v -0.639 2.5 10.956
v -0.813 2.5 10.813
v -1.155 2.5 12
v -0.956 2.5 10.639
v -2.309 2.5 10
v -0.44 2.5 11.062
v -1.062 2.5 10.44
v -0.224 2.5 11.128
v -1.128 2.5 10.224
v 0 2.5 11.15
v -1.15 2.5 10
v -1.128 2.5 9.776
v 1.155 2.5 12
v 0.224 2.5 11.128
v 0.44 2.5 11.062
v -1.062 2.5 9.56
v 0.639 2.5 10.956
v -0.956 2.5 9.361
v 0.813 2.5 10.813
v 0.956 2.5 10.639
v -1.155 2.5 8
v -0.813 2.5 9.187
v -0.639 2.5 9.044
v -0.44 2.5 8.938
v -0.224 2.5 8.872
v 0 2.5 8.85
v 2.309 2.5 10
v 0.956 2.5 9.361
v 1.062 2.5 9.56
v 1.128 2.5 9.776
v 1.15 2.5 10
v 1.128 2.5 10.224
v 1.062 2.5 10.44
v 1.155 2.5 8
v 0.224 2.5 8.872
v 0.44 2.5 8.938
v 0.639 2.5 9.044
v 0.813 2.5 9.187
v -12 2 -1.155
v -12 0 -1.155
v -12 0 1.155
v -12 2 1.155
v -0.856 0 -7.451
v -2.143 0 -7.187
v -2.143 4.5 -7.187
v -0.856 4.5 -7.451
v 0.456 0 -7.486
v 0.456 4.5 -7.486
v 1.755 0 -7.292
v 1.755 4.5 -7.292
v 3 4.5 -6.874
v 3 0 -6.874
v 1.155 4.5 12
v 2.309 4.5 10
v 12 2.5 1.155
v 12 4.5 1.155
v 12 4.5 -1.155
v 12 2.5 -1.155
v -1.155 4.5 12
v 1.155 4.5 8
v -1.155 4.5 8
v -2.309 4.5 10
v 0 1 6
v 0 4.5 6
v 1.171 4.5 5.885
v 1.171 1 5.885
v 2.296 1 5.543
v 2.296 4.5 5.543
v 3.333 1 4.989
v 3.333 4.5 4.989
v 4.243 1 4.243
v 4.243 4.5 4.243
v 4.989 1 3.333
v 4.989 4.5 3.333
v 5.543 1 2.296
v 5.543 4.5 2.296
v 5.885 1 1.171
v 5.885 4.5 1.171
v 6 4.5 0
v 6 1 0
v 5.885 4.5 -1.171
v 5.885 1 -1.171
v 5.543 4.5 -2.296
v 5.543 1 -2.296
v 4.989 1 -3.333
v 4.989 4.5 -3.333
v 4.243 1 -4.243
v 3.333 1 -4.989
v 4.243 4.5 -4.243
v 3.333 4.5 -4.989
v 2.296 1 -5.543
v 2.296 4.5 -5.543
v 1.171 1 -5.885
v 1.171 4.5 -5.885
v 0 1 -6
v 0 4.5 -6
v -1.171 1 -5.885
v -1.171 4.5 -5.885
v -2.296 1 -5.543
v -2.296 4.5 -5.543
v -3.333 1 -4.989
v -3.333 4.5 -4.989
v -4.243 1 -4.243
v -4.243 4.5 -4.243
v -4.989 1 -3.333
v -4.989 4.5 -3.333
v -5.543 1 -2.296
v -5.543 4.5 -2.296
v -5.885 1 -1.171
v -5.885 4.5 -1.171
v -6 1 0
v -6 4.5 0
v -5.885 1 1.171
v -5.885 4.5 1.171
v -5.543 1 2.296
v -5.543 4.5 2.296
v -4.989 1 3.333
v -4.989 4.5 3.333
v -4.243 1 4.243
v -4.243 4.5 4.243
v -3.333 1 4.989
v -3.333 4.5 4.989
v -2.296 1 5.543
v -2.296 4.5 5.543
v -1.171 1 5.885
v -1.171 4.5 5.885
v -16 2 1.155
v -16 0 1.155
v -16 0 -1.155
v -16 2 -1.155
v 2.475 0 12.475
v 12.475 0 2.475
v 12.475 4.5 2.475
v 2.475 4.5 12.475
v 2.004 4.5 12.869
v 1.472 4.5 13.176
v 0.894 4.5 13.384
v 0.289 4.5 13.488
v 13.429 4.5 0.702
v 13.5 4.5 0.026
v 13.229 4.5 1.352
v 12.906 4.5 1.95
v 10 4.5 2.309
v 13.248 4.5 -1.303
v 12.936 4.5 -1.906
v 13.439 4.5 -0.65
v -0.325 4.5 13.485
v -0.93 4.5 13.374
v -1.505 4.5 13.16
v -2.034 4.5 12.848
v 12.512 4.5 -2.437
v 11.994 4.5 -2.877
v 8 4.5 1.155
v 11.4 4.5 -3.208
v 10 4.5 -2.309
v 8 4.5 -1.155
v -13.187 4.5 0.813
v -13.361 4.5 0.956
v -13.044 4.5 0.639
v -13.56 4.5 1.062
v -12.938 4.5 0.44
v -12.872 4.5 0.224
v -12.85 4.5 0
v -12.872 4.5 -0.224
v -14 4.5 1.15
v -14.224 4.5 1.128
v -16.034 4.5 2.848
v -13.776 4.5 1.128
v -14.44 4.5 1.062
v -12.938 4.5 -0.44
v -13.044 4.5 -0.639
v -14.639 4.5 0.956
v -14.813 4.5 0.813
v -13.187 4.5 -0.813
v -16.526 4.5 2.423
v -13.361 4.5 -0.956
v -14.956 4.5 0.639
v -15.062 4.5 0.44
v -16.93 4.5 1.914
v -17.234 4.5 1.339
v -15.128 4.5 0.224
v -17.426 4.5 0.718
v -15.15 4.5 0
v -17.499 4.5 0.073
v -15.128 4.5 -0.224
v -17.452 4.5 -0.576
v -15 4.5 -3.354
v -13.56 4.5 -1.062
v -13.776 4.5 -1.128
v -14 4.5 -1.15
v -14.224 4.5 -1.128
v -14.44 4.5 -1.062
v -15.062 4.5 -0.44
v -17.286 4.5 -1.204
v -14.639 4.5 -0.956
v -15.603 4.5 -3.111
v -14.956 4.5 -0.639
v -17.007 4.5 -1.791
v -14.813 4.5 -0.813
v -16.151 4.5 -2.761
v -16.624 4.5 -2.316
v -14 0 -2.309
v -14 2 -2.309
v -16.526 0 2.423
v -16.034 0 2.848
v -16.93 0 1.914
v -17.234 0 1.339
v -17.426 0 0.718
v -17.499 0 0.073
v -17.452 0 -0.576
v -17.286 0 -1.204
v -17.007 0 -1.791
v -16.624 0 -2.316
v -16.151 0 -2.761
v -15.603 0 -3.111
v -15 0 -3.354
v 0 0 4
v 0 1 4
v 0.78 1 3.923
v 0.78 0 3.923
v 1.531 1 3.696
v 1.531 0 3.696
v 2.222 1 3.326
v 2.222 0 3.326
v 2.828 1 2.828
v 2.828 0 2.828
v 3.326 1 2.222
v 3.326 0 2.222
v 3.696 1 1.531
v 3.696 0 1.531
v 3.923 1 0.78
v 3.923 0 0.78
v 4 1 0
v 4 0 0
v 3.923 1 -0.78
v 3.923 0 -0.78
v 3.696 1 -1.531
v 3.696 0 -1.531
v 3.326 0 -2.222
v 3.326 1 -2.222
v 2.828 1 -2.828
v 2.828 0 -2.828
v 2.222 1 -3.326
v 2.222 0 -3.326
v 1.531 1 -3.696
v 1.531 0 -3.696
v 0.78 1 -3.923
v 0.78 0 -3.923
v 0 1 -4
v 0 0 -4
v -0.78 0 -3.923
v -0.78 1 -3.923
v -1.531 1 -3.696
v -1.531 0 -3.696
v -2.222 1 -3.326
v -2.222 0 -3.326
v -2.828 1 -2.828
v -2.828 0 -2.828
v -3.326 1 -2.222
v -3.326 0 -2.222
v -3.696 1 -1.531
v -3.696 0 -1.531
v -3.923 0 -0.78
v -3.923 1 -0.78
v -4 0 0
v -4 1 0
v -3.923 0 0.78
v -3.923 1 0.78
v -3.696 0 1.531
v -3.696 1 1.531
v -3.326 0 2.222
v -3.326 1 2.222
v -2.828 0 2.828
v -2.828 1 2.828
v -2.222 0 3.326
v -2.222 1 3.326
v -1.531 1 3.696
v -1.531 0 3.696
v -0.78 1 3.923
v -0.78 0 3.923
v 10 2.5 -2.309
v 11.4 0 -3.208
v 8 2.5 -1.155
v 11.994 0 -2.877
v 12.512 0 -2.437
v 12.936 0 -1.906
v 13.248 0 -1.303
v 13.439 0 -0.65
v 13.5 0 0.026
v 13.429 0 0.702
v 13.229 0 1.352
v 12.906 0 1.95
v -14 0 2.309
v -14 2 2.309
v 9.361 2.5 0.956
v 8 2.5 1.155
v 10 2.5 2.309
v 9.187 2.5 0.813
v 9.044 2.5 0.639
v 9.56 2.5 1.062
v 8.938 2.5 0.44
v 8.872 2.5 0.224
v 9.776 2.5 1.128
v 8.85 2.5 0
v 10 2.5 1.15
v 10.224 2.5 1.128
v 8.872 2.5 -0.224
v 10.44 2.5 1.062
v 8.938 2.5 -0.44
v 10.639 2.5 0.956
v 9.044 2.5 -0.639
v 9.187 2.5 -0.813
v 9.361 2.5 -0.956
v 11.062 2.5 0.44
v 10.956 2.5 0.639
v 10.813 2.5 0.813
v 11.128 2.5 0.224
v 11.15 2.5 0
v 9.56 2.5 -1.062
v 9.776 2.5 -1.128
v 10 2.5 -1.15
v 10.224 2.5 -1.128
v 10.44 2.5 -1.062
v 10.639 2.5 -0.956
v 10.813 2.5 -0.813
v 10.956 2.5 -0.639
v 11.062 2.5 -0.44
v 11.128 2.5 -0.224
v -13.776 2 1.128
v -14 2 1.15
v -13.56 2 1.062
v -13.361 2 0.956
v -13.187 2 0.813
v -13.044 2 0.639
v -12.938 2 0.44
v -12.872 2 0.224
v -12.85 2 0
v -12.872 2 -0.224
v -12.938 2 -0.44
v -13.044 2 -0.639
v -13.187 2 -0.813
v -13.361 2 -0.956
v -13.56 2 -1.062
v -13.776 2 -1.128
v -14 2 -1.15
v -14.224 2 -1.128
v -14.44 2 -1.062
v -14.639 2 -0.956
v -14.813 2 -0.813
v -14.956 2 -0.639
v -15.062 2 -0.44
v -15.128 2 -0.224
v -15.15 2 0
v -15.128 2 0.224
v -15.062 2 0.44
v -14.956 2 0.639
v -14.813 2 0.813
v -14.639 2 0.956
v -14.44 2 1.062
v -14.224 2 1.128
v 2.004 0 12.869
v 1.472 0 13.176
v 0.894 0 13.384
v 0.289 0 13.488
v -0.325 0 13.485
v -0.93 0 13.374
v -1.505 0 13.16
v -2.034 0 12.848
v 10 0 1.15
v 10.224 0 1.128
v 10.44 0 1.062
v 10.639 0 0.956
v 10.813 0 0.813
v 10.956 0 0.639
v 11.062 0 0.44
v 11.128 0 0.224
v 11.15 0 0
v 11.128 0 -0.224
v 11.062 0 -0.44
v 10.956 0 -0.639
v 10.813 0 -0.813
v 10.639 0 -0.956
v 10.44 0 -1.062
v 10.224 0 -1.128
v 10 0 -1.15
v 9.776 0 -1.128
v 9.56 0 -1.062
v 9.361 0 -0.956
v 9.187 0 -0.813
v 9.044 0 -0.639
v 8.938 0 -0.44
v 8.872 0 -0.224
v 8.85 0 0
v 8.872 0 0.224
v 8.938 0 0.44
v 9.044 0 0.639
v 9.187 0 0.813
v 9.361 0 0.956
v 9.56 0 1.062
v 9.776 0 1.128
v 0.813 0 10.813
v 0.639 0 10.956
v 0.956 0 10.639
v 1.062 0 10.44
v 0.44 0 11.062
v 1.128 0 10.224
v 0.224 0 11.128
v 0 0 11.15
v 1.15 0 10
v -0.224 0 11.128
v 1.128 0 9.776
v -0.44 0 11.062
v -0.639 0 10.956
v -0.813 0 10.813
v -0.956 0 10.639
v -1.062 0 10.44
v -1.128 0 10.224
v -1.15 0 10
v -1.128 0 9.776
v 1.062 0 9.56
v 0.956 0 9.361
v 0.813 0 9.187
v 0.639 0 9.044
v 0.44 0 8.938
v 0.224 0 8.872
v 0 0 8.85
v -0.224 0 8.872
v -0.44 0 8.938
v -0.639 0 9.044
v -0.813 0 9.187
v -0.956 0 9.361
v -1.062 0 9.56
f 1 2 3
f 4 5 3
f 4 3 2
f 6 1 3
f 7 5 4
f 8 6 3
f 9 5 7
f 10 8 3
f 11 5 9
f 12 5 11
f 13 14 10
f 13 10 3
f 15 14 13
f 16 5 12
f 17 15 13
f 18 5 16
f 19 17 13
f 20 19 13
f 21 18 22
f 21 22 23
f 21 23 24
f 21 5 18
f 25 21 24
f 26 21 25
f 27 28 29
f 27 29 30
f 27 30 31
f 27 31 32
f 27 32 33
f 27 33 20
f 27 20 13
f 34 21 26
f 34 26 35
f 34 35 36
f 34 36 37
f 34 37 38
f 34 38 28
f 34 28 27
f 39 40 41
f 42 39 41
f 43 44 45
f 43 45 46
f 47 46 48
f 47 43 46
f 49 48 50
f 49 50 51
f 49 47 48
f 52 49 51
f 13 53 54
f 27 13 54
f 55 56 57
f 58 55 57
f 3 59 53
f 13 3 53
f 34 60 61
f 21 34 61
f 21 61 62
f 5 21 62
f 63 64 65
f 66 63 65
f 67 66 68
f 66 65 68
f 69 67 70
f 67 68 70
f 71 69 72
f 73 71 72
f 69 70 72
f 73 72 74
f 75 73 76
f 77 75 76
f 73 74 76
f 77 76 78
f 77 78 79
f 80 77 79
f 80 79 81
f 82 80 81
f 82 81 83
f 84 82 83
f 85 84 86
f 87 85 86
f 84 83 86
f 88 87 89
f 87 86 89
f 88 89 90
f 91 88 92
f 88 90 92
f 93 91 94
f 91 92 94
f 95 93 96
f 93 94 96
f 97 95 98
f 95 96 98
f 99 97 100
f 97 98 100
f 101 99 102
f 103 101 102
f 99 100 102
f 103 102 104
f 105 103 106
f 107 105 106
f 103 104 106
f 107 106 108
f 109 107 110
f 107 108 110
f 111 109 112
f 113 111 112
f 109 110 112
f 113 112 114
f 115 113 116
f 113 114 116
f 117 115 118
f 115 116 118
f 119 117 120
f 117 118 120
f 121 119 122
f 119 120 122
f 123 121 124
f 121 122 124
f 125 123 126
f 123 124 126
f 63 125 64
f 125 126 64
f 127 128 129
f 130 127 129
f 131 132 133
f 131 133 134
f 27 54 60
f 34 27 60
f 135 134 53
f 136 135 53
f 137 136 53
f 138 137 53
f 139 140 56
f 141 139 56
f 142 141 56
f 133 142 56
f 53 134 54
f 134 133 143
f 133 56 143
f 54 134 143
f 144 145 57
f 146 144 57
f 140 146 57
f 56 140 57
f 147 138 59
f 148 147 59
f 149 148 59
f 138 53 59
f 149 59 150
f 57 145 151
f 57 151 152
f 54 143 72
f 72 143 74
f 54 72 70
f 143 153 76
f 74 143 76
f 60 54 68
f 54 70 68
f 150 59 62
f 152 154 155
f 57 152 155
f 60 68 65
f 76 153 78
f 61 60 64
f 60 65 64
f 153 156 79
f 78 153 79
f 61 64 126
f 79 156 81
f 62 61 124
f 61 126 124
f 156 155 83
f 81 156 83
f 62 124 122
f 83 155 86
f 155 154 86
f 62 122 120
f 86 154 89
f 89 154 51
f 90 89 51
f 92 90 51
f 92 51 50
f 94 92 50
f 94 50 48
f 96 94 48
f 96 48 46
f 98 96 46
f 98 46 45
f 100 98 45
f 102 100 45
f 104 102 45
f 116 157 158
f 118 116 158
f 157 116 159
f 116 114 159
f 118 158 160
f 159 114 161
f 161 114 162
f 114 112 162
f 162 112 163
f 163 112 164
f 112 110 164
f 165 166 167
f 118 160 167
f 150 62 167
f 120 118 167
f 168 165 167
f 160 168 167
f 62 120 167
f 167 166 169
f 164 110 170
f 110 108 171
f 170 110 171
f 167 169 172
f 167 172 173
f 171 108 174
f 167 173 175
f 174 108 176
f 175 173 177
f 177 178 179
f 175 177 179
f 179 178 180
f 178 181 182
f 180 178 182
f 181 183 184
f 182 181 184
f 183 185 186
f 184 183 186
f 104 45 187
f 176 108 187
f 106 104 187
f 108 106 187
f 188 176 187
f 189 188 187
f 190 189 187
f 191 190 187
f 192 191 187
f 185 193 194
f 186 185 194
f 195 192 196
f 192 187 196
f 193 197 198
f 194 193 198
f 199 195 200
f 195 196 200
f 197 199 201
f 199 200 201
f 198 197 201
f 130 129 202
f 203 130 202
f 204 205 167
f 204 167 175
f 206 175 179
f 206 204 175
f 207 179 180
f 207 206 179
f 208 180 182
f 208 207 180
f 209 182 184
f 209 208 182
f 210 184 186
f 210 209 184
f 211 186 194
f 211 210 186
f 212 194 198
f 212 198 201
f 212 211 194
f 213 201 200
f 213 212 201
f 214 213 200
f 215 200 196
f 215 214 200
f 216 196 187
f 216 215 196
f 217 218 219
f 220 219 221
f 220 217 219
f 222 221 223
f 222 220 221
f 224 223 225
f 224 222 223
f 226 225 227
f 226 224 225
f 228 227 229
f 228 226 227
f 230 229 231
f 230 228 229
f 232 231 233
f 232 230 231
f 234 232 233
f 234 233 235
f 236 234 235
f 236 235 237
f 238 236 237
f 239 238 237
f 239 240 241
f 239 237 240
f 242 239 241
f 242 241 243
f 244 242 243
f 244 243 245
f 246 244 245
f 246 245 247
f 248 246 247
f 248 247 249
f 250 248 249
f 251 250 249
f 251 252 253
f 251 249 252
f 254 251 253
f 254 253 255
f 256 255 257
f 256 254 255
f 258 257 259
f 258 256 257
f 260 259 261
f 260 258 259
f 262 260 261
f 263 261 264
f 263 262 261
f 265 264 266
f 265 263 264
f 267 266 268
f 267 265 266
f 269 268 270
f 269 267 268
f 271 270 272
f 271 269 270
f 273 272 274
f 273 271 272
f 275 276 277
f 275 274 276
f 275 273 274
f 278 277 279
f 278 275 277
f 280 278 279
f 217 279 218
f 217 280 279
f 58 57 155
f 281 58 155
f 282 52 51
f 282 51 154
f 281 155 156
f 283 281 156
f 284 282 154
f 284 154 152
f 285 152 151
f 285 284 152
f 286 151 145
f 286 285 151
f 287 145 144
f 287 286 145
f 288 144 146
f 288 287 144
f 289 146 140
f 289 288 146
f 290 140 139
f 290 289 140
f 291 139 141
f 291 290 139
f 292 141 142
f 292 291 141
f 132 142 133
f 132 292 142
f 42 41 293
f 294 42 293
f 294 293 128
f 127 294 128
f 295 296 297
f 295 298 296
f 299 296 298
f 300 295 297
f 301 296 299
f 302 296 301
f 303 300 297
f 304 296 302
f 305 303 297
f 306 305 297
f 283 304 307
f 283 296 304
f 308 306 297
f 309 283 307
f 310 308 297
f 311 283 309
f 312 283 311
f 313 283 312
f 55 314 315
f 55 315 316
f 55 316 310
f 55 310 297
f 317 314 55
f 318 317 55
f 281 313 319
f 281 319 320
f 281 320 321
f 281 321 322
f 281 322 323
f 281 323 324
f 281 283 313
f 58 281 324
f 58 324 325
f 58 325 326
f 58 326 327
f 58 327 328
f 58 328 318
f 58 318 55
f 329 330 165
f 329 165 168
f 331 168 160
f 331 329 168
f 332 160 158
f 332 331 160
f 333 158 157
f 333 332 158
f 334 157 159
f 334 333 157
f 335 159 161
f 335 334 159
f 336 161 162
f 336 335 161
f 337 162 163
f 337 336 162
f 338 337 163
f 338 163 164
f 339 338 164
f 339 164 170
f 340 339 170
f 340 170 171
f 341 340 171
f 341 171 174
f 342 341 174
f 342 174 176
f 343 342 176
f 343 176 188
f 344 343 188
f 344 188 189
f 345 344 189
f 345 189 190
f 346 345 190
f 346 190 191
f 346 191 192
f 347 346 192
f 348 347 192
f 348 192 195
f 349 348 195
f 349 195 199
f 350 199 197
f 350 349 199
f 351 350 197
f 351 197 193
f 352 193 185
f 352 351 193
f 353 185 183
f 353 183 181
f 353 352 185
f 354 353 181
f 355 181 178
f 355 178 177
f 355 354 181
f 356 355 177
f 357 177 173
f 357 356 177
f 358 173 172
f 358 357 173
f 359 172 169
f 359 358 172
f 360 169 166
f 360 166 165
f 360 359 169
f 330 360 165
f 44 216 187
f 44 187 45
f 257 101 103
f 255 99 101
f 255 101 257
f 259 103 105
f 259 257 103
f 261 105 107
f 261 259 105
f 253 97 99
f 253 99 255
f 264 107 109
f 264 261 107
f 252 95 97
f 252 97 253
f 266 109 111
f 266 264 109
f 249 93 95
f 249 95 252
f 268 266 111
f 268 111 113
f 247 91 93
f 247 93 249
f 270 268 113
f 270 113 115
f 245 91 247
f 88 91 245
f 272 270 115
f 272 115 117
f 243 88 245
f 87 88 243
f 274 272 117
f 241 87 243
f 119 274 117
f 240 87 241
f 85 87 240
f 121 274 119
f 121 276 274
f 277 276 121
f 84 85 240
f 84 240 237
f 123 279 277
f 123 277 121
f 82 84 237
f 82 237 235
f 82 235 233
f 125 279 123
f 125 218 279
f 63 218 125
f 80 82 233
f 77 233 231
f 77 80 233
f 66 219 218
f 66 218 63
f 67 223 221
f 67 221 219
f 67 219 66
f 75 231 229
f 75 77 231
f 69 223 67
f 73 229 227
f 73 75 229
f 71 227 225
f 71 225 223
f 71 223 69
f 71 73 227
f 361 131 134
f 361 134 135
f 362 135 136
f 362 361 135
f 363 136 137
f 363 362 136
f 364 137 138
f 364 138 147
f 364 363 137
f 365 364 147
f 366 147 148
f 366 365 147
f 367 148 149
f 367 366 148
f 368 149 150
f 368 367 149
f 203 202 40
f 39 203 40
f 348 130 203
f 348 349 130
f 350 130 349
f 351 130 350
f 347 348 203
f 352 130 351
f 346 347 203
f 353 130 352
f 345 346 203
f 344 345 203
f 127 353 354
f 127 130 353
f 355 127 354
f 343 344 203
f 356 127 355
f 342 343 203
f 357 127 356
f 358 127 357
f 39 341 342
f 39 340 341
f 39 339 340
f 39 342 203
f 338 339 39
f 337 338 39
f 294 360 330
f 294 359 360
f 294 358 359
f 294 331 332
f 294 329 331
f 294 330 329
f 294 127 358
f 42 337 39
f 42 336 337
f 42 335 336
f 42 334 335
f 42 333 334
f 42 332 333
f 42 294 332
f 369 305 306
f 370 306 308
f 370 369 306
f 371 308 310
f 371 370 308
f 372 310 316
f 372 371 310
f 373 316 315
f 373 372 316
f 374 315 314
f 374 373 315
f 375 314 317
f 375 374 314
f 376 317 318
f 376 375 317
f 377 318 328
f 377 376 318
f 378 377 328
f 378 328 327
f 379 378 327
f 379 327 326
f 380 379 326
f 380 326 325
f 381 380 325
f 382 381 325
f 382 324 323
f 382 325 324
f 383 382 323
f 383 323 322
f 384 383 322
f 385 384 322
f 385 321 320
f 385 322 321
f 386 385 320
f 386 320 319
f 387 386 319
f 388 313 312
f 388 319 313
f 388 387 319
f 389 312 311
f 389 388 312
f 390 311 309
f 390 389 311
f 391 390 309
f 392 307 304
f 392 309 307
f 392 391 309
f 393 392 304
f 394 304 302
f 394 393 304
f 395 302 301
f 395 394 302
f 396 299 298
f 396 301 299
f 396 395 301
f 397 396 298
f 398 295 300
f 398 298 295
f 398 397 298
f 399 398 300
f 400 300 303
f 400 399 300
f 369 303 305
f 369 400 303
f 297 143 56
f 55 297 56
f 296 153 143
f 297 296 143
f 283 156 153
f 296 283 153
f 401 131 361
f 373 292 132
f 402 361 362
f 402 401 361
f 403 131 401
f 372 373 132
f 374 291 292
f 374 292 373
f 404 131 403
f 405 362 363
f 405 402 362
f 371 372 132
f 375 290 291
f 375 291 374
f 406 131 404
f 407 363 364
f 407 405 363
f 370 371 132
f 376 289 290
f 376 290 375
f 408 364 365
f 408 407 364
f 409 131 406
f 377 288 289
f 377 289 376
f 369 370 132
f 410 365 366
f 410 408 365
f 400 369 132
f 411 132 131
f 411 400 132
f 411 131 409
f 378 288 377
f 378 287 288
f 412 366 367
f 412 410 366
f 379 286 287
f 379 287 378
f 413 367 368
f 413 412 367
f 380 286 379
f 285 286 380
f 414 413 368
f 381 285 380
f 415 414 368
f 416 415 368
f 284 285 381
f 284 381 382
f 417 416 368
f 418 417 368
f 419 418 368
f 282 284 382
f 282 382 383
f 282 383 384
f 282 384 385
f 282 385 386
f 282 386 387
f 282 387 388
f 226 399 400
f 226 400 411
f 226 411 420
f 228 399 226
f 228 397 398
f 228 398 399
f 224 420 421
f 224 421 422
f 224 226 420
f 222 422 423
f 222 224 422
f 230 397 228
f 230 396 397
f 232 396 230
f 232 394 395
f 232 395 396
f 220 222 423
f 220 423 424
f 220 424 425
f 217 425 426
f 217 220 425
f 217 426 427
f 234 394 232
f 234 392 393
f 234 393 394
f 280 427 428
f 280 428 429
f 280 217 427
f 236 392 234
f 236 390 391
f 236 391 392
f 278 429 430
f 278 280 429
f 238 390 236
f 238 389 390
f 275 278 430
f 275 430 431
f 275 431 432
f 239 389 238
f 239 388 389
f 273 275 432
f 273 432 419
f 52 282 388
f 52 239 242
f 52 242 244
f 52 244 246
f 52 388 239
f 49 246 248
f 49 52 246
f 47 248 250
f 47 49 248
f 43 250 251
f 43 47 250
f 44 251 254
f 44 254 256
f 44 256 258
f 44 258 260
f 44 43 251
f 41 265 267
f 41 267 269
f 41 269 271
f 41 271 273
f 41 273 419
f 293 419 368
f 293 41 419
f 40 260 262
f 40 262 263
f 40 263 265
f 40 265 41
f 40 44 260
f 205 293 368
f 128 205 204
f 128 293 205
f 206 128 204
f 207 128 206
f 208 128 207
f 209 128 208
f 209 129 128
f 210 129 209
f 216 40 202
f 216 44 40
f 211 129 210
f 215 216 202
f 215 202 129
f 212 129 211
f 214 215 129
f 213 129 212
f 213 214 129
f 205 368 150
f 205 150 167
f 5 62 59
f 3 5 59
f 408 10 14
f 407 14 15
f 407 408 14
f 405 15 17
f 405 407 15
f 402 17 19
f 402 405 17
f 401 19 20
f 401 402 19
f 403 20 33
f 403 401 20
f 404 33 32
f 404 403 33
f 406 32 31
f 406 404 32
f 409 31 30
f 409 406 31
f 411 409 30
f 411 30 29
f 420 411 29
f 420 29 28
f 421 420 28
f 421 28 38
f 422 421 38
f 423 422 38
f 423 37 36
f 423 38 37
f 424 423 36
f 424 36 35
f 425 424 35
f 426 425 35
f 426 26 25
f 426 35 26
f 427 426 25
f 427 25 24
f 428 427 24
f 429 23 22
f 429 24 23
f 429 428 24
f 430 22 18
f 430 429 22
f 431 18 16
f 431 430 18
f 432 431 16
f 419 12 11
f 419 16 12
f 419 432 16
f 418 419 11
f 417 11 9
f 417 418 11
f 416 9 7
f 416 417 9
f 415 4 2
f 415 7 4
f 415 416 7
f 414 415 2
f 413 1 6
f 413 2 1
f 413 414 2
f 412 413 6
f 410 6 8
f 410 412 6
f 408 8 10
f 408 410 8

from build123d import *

# Parameters (mm, degrees)
SKETCH1_R           = 4
SKETCH1_R_2         = 1.15
BOSS_EXTRUDE1_DEPTH = 4.5
SKETCH2_R           = 6
CUT_EXTRUDE1_DEPTH  = 3.5
CUT_EXTRUDE2_DEPTH  = 2
CUT_EXTRUDE3_DEPTH  = 2


with BuildPart() as part:
    # Sketch1 → Boss-Extrude1 (new body)
    with BuildSketch(Plane(origin=(0, 0, 0), x_dir=(1, 0, 0), z_dir=(0, 1, 0))):
        with BuildLine():
            Line((3, 6.873863542), (11.4, 3.207802986))
            ThreePointArc((11.4, 3.207802986), (13.439020979, 0.650488054), (12.474873734, -2.474873734))
            Line((12.474873734, -2.474873734), (2.474873734, -12.474873734))
            ThreePointArc((2.474873734, -12.474873734), (0.28868186, -13.488074366), (-2.034333678, -12.848067149))
            Line((-2.034333678, -12.848067149), (-16.034333678, -2.848067149))
            ThreePointArc((-16.034333678, -2.848067149), (-17.452321053, 0.575742432), (-15, 3.354101966))
            Line((-15, 3.354101966), (-2.142857143, 7.187361356))
            ThreePointArc((-2.142857143, 7.187361356), (0.456337254, 7.486104215), (3, 6.873863542))
        make_face()
        with Locations(Location((0, 0, 0), (0, 0, 270))):
            Circle(SKETCH1_R, mode=Mode.SUBTRACT)
        with Locations(Location((-14, 0, 0), (0, 0, 270))):
            Circle(SKETCH1_R_2, mode=Mode.SUBTRACT)
        with Locations(Location((10, 0, 0), (0, 0, 270))):
            Circle(SKETCH1_R_2, mode=Mode.SUBTRACT)
        with Locations(Location((0, -10, 0), (0, 0, 270))):
            Circle(SKETCH1_R_2, mode=Mode.SUBTRACT)
    extrude(amount=BOSS_EXTRUDE1_DEPTH)

    # Sketch2 → Cut-Extrude1 (cut)
    with BuildSketch(Plane(origin=(0, 4.5, 0), x_dir=(1, 0, 0), z_dir=(0, 1, 0))):
        with Locations(Location((0, 0, 0), (0, 0, 270))):
            Circle(SKETCH2_R)
    extrude(amount=-CUT_EXTRUDE1_DEPTH, mode=Mode.SUBTRACT)

    # Sketch3 → Cut-Extrude2 (cut)
    with BuildSketch(Plane(origin=(0, 4.5, 0), x_dir=(1, 0, 0), z_dir=(0, 1, 0))):
        Polygon((12, -1.154700538), (12, 1.154700538), (10, 2.309401077), (8, 1.154700538), (8, -1.154700538), (10, -2.309401077), align=None)
        Polygon((2.309401077, -10), (1.154700538, -8), (-1.154700538, -8), (-2.309401077, -10), (-1.154700538, -12), (1.154700538, -12), align=None)
    extrude(amount=-CUT_EXTRUDE2_DEPTH, mode=Mode.SUBTRACT)

    # Sketch4 → Cut-Extrude3 (cut)
    with BuildSketch(Plane.XZ):
        Polygon((-12, -1.154700538), (-12, 1.154700538), (-14, 2.309401077), (-16, 1.154700538), (-16, -1.154700538), (-14, -2.309401077), align=None)
    extrude(amount=-CUT_EXTRUDE3_DEPTH, mode=Mode.SUBTRACT)


solid = part.part
